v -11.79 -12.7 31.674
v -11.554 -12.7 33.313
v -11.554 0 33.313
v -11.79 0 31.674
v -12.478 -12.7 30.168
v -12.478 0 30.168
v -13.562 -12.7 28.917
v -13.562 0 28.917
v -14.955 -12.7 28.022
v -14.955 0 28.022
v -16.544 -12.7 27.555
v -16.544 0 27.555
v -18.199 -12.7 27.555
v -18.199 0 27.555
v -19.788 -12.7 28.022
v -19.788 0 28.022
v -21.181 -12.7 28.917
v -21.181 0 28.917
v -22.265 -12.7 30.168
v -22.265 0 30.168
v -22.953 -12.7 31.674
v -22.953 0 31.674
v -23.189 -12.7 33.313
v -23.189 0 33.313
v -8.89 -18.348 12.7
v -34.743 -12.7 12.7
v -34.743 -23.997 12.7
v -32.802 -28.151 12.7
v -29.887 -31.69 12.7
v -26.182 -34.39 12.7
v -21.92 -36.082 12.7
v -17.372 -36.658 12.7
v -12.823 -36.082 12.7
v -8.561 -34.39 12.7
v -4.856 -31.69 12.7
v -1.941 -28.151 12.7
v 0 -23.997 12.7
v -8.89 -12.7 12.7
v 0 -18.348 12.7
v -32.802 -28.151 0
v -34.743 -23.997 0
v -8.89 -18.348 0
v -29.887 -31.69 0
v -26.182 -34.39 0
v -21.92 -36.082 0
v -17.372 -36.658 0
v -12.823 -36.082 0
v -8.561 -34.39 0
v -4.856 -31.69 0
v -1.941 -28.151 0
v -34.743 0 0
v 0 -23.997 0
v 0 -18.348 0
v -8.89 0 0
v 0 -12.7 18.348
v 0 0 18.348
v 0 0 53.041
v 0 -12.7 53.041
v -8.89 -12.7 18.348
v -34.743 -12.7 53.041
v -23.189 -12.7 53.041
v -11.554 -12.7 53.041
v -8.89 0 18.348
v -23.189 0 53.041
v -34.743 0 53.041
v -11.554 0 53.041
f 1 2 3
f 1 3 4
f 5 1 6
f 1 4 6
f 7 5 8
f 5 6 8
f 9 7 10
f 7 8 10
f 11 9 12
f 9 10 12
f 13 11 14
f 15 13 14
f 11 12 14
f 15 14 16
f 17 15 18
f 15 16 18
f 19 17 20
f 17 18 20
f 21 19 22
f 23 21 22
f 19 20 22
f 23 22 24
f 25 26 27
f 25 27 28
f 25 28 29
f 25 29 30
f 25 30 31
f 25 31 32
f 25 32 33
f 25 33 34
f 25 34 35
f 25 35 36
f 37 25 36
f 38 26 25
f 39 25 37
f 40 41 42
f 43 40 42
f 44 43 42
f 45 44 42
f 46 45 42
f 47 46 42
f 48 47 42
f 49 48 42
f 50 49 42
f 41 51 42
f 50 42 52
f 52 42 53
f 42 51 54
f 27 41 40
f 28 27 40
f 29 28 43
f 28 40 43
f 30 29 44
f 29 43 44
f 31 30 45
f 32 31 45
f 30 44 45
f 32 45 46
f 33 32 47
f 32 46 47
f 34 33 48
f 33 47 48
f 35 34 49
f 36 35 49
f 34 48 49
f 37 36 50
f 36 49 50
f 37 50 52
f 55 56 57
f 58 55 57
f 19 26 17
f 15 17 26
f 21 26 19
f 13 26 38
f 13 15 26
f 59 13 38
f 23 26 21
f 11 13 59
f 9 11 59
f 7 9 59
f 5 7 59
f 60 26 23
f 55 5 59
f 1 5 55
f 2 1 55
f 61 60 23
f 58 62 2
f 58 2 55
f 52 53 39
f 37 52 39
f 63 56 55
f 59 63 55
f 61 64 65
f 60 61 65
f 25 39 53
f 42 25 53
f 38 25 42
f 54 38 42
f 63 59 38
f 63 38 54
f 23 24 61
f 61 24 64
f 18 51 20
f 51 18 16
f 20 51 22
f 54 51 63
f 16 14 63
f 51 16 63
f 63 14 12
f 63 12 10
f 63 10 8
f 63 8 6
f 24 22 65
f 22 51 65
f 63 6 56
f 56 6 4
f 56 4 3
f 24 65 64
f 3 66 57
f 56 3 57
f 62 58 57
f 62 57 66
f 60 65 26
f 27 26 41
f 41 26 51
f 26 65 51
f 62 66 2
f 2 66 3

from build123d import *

# Parameters (mm, degrees)
F1_DEPTH = 12.7
F3_DEPTH = 12.7
F5_DEPTH = 8.89


with BuildPart() as f1:
    # F0 (on Top) → F1 (new body)
    with BuildSketch(Plane.XY):
        with BuildLine():
            Line((0, -23.996737), (0, 0))
            Line((0, 0), (-34.743212, 0))
            Line((-34.743212, 0), (-34.743212, -23.996737))
            ThreePointArc((-34.743212, -23.996737), (-17.371606, -36.657822), (0, -23.996737))
        make_face()
    extrude(amount=F1_DEPTH)

    # F2 (on Front) → F3 (join)
    with BuildSketch(Plane.XZ):
        with BuildLine():
            Line((-34.743212, 53.041197), (-34.743212, 12.7))
            Line((-34.743212, 12.7), (0, 12.7))
            Line((0, 12.7), (0, 53.041197))
            Line((0, 53.041197), (-11.554375, 53.041197))
            Line((-11.554375, 53.041197), (-11.554375, 33.313215))
            ThreePointArc((-11.554375, 33.313215), (-17.371606, 27.495984), (-23.188837, 33.313215))
            Line((-23.188837, 33.313215), (-23.188837, 53.041197))
            Line((-23.188837, 53.041197), (-34.743212, 53.041197))
        make_face()
    extrude(amount=F3_DEPTH)

    # F4 (on face) → F5 (cut)
    with BuildSketch(Plane.YZ):
        Polygon((-18.348368, 0), (0, 0), (0, 18.348368), (-12.7, 18.348368), (-12.7, 12.7), (-18.348368, 12.7), align=None)
    extrude(amount=-F5_DEPTH, mode=Mode.SUBTRACT)


solid = f1.part
